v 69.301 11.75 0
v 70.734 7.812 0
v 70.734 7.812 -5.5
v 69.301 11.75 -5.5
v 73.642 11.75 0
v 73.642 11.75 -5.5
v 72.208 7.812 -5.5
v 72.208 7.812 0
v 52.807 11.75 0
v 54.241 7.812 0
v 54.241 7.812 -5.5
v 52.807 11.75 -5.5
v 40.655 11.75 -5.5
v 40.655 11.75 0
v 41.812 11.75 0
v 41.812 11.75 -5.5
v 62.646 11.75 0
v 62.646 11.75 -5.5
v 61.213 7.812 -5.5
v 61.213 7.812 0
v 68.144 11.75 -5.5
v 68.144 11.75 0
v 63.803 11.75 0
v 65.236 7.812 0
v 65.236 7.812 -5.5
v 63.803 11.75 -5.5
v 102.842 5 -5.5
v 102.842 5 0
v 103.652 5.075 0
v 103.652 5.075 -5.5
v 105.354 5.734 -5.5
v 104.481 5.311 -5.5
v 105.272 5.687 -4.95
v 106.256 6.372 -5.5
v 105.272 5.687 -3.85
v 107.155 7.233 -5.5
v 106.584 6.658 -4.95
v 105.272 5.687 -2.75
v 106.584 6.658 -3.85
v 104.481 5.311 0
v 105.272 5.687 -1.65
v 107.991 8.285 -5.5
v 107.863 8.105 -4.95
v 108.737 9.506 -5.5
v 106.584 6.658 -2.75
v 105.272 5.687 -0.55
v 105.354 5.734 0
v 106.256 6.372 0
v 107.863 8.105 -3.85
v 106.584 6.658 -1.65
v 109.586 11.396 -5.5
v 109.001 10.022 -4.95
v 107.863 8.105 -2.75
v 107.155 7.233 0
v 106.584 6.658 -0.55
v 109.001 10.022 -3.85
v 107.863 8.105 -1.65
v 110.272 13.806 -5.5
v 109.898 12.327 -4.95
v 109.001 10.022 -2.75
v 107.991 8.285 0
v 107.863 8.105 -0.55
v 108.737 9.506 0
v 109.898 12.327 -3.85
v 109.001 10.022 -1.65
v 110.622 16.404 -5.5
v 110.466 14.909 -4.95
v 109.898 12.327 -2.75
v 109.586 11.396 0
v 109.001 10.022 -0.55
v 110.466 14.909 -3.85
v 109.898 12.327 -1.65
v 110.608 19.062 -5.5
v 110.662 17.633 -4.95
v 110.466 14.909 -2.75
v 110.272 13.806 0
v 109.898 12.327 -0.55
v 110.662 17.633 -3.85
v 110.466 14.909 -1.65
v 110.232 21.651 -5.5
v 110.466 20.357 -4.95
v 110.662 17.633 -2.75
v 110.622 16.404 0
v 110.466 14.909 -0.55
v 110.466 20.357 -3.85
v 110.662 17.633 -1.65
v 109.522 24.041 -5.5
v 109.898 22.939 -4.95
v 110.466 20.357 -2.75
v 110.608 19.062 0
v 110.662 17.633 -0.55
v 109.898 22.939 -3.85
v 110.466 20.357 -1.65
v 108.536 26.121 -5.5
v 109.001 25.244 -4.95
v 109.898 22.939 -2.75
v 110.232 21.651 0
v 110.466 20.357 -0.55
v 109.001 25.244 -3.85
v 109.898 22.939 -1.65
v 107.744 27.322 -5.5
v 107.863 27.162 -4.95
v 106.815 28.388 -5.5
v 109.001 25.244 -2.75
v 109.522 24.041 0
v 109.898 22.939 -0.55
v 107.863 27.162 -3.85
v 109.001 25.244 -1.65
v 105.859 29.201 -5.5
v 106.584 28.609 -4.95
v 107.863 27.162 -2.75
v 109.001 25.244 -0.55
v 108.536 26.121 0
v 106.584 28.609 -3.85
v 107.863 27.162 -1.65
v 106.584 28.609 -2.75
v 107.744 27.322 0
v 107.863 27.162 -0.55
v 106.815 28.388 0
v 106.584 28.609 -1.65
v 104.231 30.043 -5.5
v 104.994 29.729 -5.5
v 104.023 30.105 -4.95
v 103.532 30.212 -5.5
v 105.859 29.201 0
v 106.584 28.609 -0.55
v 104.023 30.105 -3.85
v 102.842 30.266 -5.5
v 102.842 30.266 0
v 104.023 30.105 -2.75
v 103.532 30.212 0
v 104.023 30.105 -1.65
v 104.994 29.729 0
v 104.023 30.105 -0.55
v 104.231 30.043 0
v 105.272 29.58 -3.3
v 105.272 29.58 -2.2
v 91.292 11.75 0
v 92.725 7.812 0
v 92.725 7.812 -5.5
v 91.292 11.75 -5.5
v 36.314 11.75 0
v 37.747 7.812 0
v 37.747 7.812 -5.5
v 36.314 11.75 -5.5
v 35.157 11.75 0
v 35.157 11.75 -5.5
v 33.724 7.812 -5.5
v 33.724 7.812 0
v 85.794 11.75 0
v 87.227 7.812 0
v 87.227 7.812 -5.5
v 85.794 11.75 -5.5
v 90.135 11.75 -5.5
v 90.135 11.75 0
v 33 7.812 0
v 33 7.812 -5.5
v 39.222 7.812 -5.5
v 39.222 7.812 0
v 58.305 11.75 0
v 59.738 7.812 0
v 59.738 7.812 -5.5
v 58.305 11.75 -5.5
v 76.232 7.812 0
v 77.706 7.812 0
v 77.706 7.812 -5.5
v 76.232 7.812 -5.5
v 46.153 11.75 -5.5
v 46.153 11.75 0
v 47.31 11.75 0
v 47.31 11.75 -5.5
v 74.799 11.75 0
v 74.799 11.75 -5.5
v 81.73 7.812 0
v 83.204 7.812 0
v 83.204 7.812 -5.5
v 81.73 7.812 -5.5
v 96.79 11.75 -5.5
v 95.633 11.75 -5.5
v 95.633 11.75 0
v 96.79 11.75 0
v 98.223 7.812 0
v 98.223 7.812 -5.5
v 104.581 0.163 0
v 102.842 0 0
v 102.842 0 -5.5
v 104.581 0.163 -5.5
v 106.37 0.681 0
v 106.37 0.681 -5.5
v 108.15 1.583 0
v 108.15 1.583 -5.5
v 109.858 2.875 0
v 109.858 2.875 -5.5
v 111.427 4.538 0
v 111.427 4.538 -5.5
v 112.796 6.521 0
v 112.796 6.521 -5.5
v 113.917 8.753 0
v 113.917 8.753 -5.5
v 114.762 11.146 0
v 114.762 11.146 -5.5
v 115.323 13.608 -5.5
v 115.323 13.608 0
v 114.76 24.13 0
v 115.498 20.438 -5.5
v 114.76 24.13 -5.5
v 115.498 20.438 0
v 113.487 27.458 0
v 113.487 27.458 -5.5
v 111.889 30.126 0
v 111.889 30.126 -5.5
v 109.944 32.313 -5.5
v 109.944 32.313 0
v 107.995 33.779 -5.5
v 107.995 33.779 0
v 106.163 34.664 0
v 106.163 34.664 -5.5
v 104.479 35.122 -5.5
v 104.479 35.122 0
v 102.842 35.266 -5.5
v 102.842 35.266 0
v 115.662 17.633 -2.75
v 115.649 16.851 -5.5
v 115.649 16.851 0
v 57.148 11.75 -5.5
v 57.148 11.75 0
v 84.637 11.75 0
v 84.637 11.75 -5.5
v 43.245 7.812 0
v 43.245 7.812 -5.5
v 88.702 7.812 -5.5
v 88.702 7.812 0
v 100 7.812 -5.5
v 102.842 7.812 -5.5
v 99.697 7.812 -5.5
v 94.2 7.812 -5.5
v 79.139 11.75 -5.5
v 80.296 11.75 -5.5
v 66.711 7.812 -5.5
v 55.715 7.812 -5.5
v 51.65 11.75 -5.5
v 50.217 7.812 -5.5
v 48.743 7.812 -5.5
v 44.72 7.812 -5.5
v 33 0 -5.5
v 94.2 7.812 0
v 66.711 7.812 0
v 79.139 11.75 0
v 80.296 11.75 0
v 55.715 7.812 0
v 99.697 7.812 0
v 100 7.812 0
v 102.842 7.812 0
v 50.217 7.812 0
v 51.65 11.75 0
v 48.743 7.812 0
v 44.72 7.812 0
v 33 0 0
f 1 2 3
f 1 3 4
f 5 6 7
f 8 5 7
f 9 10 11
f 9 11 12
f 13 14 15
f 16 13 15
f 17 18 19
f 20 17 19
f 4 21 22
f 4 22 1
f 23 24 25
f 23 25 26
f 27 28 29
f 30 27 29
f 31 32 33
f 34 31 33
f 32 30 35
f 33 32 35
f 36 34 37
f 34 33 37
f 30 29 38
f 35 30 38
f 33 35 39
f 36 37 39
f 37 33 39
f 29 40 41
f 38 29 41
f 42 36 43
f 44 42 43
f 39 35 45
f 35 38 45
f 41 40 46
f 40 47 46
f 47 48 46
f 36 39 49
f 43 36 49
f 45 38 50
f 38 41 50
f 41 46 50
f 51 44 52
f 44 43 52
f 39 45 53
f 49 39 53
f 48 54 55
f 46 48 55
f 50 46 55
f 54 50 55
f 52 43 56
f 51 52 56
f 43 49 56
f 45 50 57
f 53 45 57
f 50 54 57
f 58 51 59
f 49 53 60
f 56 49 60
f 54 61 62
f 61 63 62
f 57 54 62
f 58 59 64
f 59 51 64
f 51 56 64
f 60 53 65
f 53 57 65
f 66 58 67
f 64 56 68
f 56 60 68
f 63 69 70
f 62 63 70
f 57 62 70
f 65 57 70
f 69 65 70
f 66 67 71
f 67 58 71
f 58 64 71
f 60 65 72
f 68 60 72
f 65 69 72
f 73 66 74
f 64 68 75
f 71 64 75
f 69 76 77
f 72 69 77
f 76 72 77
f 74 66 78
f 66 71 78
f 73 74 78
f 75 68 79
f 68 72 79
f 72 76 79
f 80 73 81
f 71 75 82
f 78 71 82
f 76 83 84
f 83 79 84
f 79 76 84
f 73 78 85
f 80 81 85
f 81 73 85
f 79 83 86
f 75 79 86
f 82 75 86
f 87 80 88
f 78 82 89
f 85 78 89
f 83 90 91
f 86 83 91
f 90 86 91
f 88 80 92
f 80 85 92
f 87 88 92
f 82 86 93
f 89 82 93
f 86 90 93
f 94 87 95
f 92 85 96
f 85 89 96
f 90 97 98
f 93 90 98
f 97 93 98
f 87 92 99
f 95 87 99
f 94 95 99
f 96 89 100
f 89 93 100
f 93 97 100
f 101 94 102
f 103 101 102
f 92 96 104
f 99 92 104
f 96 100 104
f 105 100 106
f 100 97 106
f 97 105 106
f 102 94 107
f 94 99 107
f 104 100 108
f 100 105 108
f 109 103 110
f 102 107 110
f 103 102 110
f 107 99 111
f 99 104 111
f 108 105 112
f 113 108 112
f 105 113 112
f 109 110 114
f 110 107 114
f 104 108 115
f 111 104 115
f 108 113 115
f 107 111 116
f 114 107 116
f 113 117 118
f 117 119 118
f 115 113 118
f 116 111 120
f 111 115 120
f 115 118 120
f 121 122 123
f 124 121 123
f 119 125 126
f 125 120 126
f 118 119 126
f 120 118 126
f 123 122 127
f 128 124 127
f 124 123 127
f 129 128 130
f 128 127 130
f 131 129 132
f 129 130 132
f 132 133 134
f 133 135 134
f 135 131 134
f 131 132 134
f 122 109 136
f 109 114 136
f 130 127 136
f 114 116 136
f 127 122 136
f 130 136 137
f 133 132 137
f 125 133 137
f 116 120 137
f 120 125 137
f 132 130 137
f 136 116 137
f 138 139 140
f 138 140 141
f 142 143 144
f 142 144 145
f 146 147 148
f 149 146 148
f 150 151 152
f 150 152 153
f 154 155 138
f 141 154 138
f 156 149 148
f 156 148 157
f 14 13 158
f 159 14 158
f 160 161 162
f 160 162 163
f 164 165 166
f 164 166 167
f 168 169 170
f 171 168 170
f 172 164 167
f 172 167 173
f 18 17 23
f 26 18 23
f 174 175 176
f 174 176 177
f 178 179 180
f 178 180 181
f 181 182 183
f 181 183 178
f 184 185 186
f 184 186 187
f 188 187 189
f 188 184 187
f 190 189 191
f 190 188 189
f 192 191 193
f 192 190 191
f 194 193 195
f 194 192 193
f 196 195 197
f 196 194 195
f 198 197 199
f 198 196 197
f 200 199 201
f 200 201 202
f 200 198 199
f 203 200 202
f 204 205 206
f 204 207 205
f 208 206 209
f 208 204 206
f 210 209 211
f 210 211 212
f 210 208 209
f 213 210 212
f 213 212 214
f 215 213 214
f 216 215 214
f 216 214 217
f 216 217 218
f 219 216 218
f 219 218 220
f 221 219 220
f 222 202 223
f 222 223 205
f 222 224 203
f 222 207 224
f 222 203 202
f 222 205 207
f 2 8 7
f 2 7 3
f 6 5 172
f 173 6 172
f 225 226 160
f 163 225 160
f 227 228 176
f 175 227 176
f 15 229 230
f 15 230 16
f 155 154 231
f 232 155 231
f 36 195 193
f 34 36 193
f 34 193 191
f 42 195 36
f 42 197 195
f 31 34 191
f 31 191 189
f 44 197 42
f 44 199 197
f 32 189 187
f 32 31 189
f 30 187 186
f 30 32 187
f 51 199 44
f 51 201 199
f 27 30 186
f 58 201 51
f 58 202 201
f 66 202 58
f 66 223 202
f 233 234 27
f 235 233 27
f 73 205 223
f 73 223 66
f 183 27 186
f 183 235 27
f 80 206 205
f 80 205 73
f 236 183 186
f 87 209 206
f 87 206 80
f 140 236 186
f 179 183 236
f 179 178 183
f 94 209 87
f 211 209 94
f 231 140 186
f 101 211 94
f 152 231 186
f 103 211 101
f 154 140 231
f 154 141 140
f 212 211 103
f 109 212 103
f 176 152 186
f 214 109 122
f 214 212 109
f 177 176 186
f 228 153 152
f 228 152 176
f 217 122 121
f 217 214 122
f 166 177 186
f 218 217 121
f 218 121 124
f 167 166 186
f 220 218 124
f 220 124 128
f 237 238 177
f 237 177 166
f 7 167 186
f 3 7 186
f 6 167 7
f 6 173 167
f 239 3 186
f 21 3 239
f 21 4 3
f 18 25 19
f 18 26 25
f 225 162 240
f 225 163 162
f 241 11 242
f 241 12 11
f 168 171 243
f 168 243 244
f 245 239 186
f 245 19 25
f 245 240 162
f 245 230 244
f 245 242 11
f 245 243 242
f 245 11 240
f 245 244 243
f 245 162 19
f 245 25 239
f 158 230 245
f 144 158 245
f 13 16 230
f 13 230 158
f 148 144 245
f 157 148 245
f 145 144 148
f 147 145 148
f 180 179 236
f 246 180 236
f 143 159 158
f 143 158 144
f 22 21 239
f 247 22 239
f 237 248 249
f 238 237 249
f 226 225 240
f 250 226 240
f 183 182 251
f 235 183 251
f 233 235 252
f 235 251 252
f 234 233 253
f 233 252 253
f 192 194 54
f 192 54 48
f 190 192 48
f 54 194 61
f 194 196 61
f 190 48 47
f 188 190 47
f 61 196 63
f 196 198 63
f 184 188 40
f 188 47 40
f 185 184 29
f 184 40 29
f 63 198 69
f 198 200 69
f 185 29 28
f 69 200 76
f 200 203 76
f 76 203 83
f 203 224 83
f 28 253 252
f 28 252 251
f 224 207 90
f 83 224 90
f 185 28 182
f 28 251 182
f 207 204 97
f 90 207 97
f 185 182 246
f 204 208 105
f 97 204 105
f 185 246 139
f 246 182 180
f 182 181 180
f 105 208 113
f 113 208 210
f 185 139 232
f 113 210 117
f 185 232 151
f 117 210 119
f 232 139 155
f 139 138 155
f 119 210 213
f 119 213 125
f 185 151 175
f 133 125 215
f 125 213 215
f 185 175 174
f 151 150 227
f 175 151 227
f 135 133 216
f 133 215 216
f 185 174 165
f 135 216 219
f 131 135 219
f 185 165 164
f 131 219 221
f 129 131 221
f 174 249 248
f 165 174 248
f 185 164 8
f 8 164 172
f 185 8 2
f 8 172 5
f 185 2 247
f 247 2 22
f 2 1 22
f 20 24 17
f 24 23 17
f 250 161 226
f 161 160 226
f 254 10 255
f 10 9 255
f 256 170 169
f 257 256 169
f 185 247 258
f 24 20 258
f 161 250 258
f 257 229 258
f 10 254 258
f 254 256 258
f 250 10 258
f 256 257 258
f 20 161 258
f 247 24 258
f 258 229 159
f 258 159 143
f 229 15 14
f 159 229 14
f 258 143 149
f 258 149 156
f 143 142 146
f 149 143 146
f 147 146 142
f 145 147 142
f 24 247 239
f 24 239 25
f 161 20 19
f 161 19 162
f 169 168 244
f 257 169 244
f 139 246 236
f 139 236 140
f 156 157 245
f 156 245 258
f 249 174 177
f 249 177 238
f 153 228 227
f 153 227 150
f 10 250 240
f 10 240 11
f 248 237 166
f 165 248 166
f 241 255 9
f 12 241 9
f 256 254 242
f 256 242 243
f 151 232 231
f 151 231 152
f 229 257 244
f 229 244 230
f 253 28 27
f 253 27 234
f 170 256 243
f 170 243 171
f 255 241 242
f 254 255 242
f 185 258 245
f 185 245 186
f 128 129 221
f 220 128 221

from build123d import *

# Parameters (mm, degrees)
BLANKSKE_W          = 100
BLANKSKE_H          = 11.75
BLANK_DEPTH         = 10
TOOTHCUTSIM_DEPTH   = 102.183311371
TEETHCUTS_COUNT     = 19
TEETHCUTS_PITCH     = 5.497787137
SKETCH_3_W          = 2.841503757
SKETCH_3_H          = 7.8125
EXTRUDE_1_DEPTH     = 10
EXTRUDE_2_DEPTH     = 5.5
SKETCH_6_W          = 102.841503757
SKETCH_6_H          = 15
CUT_EXTRUDE_2_DEPTH = 4.5
SKETCH_7_W          = 1.160244479
SKETCH_7_H          = 1.204796587
CUT_EXTRUDE_3_DEPTH = 5.5
SKETCH_8_W          = 16.666168626
SKETCH_8_H          = 26.64996686
CUT_EXTRUDE_5_DEPTH = 33


with BuildPart() as part:
    # BlankSke → Blank (new body)
    with BuildSketch(Plane.XY):
        with Locations((50, 5.875)):
            Rectangle(BLANKSKE_W, BLANKSKE_H)
    extrude(amount=-BLANK_DEPTH)

    # TooCutSkeSim → ToothCutSim (cut, through all)
    with BuildSketch(Plane.XY):
        Polygon((0.737261897, 7.8125), (-0.737261897, 7.8125), (-2.179639538, 11.7754), (2.179639538, 11.7754), align=None)
    toothcutsim = extrude(amount=-TOOTHCUTSIM_DEPTH, mode=Mode.SUBTRACT)

    # TeethCuts: ToothCutSim ×19
    with Locations(*[(i * TEETHCUTS_PITCH, 0, 0) for i in range(1, TEETHCUTS_COUNT)]):
        add(toothcutsim, mode=Mode.SUBTRACT)

    # 草图3 → 凸台-拉伸1 (add)
    with BuildSketch(Plane.XY):
        with Locations((101.420751878, 3.90625)):
            Rectangle(SKETCH_3_W, SKETCH_3_H)
    extrude(amount=-EXTRUDE_1_DEPTH)

    # 草图5 → 凸台-拉伸2 (add)
    with BuildSketch(Plane.XY):
        with BuildLine():
            Line((102.841503757, 0), (102.841503757, 5))
            add(Edge.make_bspline(
                [(102.841503757, 5), (103.239034049, 5), (104.005784609, 5.102799889), (105.677797401, 5.778606013), (107.956900824, 7.77823047), (110.125468295, 12.137732801), (110.929574998, 17.633214309), (110.125468295, 23.128695817), (107.956900824, 27.488198148), (105.677797401, 29.487822605), (104.005784609, 30.163628729), (103.239034049, 30.266428618), (102.841503757, 30.266428618)],
                knots=[3.141592654, 3.141592654, 3.141592654, 3.141592654, 3.337942194, 3.534291735, 3.926990817, 4.319689899, 4.71238898, 5.105088062, 5.497787144, 5.890486225, 6.086835766, 6.283185307, 6.283185307, 6.283185307, 6.283185307], degree=3))
            Line((102.841503757, 30.266428618), (102.841503757, 35.266428618))
            add(Edge.make_bspline(
                [(102.841503757, 0), (115.66153943, 0), (115.66153943, 17.633214309), (115.66153943, 35.266428618), (102.841503757, 35.266428618)],
                knots=[3.141592654, 3.141592654, 3.141592654, 4.71238898, 4.71238898, 6.283185307, 6.283185307, 6.283185307], degree=2, weights=[1, 0.707106781, 1, 0.707106781, 1]))
        make_face()
    extrude(amount=-EXTRUDE_2_DEPTH)

    # 草图6 → 切除-拉伸2 (cut)
    with BuildSketch(Plane(origin=(0, 0, -10), x_dir=(-1, 0, 0), z_dir=(0, 0, -1))):
        with Locations((-51.420751879, 7.5)):
            Rectangle(SKETCH_6_W, SKETCH_6_H)
    extrude(amount=-CUT_EXTRUDE_2_DEPTH, mode=Mode.SUBTRACT)

    # 草图7 → 切除-拉伸3 (cut)
    with BuildSketch(Plane.XY):
        with Locations((99.931909363, 8.414898294)):
            Rectangle(SKETCH_7_W, SKETCH_7_H)
    extrude(amount=-CUT_EXTRUDE_3_DEPTH, mode=Mode.SUBTRACT)

    # 草图8 → 切除-拉伸5 (cut)
    with BuildSketch(Plane.ZY):
        Rectangle(SKETCH_8_W, SKETCH_8_H)
    extrude(amount=-CUT_EXTRUDE_5_DEPTH, mode=Mode.SUBTRACT)


solid = part.part
